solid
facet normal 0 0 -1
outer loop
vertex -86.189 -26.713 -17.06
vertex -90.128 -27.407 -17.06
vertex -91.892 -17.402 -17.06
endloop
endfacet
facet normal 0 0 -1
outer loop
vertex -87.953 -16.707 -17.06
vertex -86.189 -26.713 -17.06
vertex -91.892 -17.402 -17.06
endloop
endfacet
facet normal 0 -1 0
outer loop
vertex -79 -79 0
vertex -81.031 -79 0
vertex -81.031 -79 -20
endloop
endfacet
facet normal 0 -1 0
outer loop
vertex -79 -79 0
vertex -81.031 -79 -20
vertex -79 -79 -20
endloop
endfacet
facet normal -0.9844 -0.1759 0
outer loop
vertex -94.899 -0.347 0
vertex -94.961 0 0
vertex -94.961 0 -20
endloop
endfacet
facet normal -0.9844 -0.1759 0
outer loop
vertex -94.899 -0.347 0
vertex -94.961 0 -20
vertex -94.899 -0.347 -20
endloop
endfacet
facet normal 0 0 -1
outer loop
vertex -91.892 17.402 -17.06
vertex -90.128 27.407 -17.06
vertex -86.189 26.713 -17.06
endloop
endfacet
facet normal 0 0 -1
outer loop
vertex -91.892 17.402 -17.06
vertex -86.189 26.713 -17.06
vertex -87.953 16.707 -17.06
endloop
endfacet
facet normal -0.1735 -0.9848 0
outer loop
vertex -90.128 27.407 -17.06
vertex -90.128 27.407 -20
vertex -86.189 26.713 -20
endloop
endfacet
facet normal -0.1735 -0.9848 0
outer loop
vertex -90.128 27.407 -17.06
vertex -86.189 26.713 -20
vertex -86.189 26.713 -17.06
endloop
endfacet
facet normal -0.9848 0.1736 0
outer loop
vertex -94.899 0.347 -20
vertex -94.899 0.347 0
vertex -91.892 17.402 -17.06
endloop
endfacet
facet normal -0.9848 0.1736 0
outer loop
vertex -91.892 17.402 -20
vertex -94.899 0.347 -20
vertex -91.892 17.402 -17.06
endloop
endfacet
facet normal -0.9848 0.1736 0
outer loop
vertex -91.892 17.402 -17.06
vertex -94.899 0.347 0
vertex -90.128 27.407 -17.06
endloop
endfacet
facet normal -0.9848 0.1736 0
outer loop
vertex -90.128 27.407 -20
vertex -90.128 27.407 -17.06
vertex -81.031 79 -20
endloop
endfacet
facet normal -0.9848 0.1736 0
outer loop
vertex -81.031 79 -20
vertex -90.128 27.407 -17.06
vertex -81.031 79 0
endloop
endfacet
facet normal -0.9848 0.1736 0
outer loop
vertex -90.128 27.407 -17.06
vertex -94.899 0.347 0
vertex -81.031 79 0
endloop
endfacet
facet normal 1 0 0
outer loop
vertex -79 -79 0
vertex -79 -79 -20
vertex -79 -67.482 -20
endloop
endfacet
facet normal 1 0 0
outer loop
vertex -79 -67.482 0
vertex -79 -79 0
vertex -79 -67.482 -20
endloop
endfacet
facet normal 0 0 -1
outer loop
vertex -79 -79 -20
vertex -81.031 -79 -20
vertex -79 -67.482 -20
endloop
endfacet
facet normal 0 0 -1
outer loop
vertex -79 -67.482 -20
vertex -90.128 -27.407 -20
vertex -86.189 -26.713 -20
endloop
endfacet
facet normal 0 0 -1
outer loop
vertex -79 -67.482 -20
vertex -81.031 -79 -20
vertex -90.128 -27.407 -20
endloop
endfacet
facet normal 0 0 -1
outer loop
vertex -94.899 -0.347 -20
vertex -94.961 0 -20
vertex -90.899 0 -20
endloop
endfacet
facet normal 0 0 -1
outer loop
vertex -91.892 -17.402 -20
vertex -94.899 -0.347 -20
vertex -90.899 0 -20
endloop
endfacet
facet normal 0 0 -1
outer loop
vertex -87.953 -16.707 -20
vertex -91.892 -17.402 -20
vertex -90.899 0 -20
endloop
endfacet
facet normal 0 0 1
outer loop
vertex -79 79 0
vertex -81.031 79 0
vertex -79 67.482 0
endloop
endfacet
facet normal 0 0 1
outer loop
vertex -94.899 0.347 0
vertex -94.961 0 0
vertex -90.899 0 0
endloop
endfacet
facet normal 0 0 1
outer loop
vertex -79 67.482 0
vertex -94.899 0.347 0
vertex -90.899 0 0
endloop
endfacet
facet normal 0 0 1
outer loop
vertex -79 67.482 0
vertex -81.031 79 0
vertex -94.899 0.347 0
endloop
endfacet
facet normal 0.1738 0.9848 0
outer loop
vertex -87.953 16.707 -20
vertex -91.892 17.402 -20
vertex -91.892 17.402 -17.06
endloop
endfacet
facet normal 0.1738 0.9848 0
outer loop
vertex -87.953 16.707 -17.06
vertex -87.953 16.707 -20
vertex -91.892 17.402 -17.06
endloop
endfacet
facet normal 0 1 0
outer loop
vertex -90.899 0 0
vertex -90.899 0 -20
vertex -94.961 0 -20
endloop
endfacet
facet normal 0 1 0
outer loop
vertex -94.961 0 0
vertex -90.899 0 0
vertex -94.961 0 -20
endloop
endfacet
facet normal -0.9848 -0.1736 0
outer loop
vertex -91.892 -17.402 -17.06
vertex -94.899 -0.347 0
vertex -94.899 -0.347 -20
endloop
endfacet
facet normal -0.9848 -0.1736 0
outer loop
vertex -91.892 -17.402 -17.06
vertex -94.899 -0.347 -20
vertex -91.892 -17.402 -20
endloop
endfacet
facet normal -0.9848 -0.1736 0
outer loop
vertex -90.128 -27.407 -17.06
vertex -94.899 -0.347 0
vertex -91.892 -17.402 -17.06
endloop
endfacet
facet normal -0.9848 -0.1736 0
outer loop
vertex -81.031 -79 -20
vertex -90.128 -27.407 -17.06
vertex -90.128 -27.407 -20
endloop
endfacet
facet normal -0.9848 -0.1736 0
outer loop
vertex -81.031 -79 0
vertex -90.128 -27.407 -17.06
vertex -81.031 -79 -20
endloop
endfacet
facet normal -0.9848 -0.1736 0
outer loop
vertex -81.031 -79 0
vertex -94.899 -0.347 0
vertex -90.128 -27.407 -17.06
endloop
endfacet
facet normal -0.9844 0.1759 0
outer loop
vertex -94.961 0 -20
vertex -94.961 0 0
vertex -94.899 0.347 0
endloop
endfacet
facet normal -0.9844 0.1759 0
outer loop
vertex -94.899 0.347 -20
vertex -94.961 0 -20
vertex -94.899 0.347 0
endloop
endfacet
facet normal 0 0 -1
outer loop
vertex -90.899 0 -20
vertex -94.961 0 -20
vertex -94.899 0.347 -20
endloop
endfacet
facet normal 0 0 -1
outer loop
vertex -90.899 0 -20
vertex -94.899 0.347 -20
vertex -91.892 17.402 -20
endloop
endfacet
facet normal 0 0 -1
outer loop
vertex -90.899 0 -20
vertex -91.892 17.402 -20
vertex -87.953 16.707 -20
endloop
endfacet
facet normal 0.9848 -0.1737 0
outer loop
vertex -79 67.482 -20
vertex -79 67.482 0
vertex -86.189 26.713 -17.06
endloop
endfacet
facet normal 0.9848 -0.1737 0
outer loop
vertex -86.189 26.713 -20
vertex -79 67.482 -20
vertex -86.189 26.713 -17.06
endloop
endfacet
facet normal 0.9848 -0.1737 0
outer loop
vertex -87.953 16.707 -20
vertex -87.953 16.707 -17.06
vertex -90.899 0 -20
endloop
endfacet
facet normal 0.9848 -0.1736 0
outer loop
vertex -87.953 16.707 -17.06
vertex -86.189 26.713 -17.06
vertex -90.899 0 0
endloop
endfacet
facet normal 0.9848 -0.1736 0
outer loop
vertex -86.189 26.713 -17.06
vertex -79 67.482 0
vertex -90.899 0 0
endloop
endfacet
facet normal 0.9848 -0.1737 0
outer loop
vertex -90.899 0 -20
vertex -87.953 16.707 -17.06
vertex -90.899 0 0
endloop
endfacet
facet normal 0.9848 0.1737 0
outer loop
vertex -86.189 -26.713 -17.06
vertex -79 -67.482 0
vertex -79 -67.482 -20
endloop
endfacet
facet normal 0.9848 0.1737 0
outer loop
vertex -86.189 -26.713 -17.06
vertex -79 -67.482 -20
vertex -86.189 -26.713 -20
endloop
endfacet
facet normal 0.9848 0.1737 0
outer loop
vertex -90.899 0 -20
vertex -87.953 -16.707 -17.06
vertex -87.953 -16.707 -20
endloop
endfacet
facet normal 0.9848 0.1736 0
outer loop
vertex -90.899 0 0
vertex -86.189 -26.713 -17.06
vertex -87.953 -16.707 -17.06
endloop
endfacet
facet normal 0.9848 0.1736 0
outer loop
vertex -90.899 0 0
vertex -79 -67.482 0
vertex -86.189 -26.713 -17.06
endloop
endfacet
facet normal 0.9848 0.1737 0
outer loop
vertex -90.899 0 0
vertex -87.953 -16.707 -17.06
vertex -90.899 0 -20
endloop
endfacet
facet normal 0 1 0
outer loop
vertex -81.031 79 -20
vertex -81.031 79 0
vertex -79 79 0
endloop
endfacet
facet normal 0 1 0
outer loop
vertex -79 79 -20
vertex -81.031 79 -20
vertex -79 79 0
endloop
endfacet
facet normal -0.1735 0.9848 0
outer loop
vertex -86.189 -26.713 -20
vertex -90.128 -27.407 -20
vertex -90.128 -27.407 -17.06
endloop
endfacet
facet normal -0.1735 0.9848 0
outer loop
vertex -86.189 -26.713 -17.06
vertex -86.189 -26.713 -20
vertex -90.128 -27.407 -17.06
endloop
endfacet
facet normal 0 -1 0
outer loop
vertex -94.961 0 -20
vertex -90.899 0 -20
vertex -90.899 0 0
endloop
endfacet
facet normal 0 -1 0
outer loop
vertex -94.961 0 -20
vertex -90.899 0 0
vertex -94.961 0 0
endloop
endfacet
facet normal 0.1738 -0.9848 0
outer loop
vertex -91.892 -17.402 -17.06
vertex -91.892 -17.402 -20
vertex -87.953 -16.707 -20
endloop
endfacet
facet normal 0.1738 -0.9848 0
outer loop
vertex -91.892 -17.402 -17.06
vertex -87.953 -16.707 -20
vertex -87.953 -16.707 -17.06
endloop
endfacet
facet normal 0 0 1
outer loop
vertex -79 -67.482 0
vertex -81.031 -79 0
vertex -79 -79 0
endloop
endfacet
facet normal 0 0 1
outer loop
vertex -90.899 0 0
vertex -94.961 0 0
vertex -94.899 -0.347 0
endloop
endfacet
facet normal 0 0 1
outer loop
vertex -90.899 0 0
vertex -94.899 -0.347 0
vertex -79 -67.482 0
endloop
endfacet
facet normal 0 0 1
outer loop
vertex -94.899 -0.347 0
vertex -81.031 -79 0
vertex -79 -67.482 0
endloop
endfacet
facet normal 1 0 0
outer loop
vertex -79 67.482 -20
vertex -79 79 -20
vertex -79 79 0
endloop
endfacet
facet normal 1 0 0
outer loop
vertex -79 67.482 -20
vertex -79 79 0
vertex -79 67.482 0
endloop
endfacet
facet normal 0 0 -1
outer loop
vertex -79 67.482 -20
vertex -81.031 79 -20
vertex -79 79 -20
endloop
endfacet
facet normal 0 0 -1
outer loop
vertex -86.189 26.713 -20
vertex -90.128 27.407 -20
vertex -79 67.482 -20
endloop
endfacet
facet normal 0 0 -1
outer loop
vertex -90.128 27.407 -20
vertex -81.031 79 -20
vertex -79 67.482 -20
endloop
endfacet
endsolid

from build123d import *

# Parameters (mm, degrees)
BOSS_EXTRUDE1_DEPTH = 20
SKETCH2_W           = 2.94
SKETCH2_H           = 10.16
CUT_EXTRUDE1_DEPTH  = 68.159900875


with BuildPart() as part:
    # Sketch1 → Boss-Extrude1 (new body)
    with BuildSketch(Plane.XY):
        Polygon((-94.899446982, -0.347296355), (-81.030853224, -79), (-79, -79), (-79, -67.482459034), (-90.898978252, 0), (-92.929831476, 0), (-94.9606847, 0), align=None)
    extrude(amount=-BOSS_EXTRUDE1_DEPTH)

    # Sketch2 → Cut-Extrude1 (cut, through all)
    with BuildSketch(Plane(origin=(-92.097269688, -16.239233496, 0), x_dir=(0, 0, 1), z_dir=(-0.9848077530122071, -0.17364817766693633, 0))):
        with Locations((-18.53, -6.260250152)):
            Rectangle(SKETCH2_W, SKETCH2_H)
    extrude(amount=-CUT_EXTRUDE1_DEPTH, mode=Mode.SUBTRACT)


with BuildPart() as body_2:
    # Mirror2: mirrored copy
    add(part.part.mirror(Plane.ZX))


solid = Compound([part.part, body_2.part])
